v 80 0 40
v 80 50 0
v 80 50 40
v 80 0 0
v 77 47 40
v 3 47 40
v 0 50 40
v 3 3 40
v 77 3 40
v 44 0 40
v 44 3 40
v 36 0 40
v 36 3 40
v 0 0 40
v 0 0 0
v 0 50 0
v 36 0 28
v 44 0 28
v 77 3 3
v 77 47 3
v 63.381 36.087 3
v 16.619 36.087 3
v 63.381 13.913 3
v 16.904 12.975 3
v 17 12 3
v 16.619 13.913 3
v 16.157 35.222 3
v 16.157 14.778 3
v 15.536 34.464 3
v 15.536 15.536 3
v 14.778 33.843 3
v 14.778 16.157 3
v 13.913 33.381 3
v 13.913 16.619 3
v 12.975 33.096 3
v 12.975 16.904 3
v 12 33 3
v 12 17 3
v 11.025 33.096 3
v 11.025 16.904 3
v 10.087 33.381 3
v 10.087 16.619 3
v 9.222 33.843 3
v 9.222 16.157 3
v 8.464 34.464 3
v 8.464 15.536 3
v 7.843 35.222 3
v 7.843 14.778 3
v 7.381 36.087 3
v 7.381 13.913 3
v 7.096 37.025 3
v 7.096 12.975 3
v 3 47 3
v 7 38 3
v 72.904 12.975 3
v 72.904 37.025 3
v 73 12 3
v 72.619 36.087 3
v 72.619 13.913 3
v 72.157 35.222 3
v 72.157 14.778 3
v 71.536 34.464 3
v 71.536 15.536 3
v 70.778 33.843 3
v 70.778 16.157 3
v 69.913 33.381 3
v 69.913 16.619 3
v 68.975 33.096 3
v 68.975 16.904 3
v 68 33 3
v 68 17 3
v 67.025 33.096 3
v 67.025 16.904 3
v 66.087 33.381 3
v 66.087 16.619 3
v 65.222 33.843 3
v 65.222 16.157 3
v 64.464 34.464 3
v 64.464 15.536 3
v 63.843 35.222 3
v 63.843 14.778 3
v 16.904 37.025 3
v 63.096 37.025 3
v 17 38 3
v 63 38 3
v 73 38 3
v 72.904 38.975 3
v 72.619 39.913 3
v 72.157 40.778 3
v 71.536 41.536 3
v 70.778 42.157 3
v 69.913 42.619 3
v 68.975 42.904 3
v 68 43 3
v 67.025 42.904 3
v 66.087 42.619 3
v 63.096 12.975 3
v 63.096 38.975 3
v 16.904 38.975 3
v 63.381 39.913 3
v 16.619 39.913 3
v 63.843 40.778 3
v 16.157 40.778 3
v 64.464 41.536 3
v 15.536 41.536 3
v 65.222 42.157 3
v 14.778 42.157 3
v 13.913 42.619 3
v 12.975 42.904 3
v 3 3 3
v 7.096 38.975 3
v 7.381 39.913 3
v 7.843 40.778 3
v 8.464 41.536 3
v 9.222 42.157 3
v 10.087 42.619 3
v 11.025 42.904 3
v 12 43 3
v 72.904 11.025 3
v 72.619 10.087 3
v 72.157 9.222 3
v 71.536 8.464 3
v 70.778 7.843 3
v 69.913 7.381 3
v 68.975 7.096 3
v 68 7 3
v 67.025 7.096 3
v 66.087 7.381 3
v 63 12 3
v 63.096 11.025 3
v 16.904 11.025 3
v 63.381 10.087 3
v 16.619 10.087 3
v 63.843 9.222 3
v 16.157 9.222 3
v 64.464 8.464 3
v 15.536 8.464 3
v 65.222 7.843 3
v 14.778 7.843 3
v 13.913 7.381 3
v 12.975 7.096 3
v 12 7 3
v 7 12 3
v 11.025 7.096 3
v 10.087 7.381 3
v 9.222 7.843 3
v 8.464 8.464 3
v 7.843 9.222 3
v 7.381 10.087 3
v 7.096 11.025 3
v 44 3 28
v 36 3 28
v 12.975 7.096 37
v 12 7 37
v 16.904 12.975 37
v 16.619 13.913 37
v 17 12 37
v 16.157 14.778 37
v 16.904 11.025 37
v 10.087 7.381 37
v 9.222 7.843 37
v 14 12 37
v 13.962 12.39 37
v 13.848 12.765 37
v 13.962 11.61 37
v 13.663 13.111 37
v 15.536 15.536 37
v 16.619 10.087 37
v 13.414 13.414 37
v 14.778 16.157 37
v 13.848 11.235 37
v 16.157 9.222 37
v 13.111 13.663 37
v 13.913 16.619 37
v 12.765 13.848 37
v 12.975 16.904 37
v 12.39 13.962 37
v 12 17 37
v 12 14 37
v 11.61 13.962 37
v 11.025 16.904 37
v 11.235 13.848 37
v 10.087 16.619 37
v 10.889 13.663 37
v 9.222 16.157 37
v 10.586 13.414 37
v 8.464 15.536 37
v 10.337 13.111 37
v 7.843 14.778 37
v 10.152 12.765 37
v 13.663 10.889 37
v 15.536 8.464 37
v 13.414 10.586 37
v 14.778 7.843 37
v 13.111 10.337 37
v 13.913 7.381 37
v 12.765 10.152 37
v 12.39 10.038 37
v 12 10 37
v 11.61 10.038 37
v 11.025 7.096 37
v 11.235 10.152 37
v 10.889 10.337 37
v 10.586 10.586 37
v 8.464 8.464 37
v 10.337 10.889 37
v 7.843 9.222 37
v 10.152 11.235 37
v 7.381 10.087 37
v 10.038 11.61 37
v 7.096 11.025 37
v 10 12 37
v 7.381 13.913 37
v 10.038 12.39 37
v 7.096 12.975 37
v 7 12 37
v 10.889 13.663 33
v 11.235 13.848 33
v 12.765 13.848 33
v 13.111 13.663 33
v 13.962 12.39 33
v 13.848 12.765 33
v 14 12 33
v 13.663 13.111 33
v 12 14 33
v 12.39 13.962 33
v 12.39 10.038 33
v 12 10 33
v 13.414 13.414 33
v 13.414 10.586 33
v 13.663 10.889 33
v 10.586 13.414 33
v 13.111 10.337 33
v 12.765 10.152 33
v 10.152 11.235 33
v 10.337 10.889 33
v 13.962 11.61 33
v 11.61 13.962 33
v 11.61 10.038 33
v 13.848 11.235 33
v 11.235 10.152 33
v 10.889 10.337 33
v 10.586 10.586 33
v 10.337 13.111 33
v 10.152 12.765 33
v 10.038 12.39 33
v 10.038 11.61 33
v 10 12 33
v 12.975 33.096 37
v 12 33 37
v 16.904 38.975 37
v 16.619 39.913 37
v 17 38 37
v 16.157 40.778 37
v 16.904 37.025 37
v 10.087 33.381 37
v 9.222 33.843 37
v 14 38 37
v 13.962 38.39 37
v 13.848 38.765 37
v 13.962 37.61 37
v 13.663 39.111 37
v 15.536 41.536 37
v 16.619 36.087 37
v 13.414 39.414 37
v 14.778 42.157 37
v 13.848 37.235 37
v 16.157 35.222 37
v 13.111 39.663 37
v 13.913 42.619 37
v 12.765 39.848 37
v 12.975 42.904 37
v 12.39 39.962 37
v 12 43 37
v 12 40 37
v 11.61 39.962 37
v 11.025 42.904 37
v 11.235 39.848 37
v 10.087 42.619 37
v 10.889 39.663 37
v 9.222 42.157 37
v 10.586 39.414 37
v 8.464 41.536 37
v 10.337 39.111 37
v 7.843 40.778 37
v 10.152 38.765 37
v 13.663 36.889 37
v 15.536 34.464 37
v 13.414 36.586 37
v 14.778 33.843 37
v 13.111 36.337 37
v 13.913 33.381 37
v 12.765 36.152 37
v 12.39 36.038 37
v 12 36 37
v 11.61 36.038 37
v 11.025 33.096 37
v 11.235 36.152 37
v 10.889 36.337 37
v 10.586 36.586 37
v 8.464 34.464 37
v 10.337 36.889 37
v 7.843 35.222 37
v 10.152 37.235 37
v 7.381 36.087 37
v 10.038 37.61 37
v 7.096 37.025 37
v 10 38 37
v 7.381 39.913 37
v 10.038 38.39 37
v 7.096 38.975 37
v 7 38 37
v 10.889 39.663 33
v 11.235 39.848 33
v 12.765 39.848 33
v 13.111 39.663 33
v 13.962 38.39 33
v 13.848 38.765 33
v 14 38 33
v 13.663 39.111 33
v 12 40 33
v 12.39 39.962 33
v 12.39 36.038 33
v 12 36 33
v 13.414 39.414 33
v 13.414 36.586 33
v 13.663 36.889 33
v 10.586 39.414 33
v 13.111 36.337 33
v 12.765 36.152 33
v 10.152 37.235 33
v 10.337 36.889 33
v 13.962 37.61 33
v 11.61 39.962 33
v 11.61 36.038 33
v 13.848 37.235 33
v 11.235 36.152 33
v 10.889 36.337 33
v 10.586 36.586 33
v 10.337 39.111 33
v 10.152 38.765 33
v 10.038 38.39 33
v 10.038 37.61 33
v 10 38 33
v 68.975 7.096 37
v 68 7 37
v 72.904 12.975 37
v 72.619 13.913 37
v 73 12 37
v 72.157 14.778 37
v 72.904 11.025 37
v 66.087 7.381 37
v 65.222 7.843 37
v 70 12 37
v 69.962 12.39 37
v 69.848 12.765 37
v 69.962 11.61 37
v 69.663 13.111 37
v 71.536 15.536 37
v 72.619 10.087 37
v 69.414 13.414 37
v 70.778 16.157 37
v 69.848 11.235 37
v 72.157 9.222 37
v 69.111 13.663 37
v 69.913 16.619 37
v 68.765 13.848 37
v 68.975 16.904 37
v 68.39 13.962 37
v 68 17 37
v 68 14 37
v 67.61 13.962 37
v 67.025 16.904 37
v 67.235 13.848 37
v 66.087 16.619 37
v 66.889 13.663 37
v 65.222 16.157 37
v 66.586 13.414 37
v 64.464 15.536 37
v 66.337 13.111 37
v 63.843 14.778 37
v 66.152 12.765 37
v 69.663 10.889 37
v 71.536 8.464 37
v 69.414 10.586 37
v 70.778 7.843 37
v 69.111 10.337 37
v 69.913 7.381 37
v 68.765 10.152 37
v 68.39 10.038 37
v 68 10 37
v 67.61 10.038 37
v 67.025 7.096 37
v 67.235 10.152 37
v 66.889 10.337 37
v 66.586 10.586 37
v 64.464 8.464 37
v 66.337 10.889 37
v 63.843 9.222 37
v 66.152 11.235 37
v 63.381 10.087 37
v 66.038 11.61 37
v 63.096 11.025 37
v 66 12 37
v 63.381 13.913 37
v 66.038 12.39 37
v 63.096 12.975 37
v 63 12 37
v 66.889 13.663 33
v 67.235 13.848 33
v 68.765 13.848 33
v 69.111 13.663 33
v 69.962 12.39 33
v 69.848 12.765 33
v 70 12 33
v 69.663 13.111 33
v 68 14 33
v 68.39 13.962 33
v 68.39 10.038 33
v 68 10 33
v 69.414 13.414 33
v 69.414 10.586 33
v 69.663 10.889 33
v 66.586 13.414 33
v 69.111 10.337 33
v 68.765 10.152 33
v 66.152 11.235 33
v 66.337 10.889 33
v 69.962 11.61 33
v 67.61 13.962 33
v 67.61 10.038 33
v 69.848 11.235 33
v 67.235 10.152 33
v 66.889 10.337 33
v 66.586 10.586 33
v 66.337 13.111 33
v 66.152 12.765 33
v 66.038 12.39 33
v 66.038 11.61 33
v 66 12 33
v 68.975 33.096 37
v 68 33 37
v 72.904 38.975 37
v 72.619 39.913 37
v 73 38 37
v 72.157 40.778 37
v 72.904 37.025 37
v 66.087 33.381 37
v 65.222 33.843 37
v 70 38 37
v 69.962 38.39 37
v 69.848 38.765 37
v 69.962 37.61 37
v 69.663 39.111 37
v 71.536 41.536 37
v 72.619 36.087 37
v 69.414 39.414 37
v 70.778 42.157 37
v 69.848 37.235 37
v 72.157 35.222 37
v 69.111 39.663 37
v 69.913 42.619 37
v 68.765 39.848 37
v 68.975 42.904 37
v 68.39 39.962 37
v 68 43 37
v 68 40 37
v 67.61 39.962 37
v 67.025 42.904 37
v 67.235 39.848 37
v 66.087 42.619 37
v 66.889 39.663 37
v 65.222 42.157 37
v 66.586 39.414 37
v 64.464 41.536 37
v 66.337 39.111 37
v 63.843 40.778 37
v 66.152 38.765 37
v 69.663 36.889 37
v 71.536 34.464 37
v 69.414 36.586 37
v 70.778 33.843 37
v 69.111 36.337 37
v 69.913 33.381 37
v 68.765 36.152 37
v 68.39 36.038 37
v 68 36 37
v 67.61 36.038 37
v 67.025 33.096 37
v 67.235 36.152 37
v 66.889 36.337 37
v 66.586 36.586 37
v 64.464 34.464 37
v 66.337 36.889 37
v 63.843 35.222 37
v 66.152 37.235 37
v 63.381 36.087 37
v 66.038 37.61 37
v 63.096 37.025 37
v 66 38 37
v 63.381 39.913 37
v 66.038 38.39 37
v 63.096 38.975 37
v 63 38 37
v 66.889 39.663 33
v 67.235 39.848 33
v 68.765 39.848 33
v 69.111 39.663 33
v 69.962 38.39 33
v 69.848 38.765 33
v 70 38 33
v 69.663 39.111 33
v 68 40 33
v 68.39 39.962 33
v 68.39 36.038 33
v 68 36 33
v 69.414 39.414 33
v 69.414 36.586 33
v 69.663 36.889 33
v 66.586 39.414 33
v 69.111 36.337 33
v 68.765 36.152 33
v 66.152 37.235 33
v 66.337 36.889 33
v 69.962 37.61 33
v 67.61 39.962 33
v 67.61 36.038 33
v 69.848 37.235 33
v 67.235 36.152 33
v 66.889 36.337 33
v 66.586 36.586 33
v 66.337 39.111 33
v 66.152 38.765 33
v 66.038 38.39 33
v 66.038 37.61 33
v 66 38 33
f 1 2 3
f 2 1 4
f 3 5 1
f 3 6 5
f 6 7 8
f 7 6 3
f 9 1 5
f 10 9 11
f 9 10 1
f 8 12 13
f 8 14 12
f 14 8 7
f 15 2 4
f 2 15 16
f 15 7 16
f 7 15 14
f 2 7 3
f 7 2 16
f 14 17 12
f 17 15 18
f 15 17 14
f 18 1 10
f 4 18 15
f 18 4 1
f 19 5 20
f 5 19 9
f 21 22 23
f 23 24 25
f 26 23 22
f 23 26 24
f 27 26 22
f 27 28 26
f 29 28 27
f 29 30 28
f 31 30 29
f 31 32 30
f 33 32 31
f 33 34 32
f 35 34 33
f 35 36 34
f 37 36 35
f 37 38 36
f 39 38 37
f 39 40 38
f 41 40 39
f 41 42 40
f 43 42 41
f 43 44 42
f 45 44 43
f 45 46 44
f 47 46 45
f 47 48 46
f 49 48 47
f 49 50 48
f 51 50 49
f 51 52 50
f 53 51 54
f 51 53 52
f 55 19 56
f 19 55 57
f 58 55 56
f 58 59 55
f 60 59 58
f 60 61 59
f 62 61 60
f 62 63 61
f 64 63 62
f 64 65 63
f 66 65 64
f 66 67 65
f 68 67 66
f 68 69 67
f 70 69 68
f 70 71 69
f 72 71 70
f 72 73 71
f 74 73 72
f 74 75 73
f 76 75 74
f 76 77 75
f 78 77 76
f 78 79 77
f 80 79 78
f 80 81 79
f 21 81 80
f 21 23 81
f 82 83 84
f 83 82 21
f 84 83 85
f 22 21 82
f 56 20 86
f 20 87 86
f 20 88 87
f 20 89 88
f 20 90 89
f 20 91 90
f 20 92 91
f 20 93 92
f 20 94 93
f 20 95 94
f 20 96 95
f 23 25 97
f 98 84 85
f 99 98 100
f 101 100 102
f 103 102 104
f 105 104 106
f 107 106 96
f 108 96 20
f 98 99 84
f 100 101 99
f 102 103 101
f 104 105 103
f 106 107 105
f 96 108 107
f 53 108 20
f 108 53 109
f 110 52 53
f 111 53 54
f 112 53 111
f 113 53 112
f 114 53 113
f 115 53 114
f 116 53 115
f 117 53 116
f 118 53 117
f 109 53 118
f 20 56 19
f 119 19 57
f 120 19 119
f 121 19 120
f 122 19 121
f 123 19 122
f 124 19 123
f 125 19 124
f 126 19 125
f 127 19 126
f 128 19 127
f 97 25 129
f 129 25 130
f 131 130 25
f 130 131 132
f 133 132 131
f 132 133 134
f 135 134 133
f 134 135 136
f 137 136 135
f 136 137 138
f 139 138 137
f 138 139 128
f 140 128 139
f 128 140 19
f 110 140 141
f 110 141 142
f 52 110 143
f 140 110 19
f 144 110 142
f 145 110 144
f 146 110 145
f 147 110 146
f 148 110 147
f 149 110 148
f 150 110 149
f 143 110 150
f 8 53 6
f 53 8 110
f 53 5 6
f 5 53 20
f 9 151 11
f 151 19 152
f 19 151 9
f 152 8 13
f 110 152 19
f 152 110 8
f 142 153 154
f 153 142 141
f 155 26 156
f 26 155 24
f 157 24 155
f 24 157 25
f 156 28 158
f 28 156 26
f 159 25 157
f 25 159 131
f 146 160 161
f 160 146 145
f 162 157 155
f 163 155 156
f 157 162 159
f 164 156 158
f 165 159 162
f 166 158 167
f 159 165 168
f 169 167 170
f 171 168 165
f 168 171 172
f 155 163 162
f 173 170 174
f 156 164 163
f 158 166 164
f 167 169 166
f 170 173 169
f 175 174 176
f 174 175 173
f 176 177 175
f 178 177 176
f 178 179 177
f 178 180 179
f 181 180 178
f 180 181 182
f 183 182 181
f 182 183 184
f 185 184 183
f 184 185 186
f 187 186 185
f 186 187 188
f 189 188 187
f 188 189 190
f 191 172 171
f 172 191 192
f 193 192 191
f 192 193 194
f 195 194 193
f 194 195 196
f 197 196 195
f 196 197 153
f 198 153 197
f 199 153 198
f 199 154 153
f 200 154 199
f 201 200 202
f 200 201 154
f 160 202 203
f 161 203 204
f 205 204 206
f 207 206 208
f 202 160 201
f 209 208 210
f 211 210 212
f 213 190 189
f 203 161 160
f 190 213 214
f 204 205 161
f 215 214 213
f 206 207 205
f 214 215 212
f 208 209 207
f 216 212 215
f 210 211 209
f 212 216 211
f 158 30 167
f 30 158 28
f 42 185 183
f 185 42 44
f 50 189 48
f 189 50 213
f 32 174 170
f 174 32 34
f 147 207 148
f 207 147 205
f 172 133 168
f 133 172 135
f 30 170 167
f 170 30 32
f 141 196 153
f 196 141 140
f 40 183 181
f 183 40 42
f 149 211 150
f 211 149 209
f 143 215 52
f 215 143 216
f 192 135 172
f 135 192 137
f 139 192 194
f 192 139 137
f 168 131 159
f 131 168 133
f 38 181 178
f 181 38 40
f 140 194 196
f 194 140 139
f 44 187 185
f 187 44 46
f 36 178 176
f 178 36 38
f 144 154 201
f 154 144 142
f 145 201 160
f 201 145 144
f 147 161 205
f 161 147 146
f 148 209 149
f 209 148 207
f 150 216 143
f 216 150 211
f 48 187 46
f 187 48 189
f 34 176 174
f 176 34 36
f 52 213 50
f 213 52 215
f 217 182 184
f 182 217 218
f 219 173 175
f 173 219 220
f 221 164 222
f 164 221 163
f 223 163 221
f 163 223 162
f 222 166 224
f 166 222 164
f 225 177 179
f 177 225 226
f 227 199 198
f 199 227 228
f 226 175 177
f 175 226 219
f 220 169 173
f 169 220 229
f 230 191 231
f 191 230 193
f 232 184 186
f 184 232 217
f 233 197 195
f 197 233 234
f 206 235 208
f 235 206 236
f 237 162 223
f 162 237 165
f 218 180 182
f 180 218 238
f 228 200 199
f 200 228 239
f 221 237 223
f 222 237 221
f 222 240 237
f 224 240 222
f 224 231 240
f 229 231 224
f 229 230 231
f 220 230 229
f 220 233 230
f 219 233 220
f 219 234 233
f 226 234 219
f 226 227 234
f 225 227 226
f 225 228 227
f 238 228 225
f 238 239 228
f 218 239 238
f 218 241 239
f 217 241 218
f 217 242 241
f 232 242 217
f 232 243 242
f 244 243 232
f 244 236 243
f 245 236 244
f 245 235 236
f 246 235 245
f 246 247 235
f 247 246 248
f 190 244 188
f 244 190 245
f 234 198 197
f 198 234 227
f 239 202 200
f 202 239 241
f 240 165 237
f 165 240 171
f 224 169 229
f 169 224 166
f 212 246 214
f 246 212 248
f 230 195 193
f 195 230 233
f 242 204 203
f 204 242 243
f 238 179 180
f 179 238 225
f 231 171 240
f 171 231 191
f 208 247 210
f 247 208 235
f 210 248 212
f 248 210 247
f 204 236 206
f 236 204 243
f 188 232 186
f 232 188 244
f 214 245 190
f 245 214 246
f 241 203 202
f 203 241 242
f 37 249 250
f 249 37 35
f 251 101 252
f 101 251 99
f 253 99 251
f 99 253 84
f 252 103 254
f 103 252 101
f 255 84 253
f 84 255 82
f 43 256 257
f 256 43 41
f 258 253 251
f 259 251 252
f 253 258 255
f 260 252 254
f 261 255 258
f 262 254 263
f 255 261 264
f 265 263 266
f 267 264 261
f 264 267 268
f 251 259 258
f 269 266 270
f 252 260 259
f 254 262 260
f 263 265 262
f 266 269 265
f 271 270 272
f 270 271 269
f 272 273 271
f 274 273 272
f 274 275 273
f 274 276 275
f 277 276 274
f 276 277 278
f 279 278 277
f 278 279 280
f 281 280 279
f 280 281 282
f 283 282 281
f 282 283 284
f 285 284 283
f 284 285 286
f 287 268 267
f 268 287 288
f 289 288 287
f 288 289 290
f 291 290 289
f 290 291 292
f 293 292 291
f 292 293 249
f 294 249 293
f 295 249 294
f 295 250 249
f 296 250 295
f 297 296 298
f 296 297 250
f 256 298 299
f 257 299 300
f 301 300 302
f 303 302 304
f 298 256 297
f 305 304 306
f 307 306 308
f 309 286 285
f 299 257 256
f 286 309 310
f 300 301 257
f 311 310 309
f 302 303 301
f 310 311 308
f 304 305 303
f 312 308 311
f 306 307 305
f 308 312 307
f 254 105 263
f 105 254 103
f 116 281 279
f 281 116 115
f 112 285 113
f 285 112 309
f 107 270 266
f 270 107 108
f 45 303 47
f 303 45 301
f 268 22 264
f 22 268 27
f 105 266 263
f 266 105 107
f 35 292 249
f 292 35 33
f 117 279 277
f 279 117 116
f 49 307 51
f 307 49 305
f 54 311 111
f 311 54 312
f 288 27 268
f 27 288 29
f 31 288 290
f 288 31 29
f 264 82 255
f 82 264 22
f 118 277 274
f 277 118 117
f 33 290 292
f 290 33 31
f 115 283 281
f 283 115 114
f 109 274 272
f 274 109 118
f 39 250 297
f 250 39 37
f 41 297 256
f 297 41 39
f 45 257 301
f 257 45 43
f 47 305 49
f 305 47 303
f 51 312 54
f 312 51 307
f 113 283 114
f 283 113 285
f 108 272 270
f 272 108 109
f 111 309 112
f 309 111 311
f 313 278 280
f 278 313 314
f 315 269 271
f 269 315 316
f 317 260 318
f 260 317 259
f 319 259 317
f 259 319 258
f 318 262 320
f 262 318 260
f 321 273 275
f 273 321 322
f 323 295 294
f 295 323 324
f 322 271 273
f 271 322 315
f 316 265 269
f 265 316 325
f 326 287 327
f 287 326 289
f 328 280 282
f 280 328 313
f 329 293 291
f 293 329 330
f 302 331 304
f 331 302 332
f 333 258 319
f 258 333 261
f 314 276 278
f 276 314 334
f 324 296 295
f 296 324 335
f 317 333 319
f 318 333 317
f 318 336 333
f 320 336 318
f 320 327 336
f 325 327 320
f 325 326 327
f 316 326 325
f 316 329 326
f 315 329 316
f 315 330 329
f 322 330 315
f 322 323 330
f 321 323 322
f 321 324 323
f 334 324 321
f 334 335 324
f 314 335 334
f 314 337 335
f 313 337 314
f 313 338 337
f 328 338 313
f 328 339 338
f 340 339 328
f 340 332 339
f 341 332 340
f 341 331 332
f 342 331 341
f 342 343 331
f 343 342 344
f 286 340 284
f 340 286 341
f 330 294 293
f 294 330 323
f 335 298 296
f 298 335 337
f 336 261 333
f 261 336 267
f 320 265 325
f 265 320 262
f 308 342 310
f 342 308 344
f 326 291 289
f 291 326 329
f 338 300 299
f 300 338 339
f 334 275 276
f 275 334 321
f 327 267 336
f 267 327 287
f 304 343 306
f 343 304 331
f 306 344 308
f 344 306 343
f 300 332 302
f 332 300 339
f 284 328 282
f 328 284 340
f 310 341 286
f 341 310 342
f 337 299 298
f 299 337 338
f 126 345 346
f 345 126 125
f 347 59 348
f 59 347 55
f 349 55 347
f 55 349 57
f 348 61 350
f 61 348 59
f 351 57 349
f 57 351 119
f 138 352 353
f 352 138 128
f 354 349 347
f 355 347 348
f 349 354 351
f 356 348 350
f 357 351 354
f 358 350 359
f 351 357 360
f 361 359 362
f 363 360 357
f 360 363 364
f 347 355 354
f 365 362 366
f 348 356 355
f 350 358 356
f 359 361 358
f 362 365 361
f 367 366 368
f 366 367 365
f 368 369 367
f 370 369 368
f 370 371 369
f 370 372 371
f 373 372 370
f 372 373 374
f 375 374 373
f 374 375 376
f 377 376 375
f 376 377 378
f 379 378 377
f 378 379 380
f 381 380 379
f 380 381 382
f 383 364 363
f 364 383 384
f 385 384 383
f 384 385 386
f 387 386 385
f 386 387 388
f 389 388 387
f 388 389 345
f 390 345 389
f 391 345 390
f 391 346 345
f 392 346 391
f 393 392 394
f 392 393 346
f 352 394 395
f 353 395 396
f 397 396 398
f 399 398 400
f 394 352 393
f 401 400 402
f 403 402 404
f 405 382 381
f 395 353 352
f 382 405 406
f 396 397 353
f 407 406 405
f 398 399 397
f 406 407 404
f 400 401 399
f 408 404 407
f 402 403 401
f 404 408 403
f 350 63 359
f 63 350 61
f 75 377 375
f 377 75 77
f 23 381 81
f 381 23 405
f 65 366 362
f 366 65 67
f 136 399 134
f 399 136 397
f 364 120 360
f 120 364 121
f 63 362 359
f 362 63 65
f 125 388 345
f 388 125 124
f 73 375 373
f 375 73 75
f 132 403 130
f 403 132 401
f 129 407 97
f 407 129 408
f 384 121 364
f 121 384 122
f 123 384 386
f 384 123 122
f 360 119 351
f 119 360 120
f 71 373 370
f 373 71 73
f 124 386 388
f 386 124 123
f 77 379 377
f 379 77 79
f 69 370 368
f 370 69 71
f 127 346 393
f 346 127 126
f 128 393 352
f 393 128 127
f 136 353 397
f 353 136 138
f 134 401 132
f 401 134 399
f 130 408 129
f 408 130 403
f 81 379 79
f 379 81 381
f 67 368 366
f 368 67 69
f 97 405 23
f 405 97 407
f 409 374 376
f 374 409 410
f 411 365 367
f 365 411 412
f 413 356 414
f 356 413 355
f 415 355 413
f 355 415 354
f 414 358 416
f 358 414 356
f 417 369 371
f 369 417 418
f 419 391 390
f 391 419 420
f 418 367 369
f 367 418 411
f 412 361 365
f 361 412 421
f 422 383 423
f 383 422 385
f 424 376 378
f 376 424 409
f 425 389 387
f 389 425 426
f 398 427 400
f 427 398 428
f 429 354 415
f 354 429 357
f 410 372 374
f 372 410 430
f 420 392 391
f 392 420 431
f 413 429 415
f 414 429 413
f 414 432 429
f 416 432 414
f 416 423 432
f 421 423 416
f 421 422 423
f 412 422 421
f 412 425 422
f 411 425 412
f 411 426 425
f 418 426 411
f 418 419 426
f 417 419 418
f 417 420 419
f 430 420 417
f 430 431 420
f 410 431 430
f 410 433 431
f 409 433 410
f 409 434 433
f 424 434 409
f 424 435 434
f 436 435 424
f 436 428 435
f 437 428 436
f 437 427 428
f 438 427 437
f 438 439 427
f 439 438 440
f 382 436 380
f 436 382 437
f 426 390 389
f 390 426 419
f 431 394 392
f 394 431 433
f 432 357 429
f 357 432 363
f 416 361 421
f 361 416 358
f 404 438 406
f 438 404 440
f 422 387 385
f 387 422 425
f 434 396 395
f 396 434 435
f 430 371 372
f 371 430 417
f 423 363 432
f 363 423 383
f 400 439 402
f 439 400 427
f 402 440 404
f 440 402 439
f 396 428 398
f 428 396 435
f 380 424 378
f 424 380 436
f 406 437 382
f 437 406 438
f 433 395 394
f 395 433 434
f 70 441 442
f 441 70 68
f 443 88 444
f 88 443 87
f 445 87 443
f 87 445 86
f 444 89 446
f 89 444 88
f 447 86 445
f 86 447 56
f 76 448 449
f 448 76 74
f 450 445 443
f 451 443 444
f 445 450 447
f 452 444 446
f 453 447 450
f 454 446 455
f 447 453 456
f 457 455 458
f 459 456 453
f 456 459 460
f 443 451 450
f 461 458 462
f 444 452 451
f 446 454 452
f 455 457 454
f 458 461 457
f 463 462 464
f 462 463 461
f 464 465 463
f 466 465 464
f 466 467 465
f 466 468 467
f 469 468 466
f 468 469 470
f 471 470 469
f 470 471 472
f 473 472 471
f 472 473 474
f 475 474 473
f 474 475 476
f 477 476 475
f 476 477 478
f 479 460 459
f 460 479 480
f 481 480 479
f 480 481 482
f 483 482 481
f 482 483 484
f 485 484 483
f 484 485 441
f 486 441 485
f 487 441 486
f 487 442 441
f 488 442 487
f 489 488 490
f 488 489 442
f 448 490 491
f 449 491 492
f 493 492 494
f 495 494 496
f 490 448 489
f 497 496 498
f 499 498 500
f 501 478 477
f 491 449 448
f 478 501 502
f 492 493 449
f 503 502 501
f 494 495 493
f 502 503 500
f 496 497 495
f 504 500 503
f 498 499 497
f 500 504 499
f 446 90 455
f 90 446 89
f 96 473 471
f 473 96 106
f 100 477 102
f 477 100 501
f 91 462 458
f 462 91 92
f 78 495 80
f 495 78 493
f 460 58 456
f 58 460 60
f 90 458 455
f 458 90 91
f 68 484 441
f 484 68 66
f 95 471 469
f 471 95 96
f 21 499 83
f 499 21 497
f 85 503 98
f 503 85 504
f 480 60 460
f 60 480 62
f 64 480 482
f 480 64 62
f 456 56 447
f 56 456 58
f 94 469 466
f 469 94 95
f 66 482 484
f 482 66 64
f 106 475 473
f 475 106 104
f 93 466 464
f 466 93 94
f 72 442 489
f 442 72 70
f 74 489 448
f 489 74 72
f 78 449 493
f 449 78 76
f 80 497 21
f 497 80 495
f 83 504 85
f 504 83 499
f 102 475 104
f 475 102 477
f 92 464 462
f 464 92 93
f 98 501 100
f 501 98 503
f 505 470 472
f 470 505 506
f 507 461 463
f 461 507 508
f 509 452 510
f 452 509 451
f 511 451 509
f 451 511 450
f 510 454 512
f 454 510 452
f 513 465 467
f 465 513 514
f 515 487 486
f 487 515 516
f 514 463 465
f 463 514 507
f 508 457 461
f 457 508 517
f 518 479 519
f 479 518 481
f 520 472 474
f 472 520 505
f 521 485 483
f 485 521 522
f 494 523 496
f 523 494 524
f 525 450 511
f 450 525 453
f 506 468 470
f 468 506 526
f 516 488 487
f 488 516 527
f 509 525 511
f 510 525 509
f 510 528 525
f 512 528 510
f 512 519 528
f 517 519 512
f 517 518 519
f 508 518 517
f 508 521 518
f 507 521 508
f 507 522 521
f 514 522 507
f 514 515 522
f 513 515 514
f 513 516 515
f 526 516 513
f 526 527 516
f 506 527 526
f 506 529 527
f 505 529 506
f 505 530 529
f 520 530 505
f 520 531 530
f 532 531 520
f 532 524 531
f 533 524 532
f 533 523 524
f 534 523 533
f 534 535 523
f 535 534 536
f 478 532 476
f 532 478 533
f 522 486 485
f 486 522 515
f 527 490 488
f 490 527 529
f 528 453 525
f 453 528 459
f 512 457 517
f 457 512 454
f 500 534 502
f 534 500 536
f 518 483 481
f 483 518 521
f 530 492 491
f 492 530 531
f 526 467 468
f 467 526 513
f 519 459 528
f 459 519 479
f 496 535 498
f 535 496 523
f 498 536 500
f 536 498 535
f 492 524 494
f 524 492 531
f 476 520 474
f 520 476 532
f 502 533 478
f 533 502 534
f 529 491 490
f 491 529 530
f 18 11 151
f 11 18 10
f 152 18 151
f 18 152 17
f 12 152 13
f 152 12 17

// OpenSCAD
$fn = 32;

// ----------------------------------------------------------------------
// Enclosure box: both enclosure
// ----------------------------------------------------------------------

// --- parameters (mm) ---
box_l = 80;               // outer length, X
box_w = 50;               // outer width, Y
box_h = 40;               // outer height
wall_t = 3;               // wall thickness
boss_r = 5;               // corner boss radius
hole_r = 2;               // boss screw hole radius
boss_in = 12;             // boss inset from the corners
notch_w = 8;              // cable notch width
notch_h = 12;             // cable notch height

inner_h = box_h - wall_t;  // cavity depth
boss_h = inner_h - 2;  // corner boss height

difference() {
  union() {
    difference() {
      cube([box_l, box_w, box_h]);
      translate([wall_t, wall_t, wall_t])
        cube([box_l - 2 * wall_t, box_w - 2 * wall_t, box_h]);
    }
    for (sx = [0, 1], sy = [0, 1])
      translate([sx ? box_l - boss_in : boss_in,
                 sy ? box_w - boss_in : boss_in, wall_t - 1])
        difference() {
          cylinder(r = boss_r, h = boss_h);
          translate([0, 0, boss_h - 4])
            cylinder(r = hole_r, h = 5);
        }
  }
  translate([box_l / 2 - notch_w / 2, -1, box_h - notch_h])
    cube([notch_w, wall_t + 2, notch_h + 1]);
}
